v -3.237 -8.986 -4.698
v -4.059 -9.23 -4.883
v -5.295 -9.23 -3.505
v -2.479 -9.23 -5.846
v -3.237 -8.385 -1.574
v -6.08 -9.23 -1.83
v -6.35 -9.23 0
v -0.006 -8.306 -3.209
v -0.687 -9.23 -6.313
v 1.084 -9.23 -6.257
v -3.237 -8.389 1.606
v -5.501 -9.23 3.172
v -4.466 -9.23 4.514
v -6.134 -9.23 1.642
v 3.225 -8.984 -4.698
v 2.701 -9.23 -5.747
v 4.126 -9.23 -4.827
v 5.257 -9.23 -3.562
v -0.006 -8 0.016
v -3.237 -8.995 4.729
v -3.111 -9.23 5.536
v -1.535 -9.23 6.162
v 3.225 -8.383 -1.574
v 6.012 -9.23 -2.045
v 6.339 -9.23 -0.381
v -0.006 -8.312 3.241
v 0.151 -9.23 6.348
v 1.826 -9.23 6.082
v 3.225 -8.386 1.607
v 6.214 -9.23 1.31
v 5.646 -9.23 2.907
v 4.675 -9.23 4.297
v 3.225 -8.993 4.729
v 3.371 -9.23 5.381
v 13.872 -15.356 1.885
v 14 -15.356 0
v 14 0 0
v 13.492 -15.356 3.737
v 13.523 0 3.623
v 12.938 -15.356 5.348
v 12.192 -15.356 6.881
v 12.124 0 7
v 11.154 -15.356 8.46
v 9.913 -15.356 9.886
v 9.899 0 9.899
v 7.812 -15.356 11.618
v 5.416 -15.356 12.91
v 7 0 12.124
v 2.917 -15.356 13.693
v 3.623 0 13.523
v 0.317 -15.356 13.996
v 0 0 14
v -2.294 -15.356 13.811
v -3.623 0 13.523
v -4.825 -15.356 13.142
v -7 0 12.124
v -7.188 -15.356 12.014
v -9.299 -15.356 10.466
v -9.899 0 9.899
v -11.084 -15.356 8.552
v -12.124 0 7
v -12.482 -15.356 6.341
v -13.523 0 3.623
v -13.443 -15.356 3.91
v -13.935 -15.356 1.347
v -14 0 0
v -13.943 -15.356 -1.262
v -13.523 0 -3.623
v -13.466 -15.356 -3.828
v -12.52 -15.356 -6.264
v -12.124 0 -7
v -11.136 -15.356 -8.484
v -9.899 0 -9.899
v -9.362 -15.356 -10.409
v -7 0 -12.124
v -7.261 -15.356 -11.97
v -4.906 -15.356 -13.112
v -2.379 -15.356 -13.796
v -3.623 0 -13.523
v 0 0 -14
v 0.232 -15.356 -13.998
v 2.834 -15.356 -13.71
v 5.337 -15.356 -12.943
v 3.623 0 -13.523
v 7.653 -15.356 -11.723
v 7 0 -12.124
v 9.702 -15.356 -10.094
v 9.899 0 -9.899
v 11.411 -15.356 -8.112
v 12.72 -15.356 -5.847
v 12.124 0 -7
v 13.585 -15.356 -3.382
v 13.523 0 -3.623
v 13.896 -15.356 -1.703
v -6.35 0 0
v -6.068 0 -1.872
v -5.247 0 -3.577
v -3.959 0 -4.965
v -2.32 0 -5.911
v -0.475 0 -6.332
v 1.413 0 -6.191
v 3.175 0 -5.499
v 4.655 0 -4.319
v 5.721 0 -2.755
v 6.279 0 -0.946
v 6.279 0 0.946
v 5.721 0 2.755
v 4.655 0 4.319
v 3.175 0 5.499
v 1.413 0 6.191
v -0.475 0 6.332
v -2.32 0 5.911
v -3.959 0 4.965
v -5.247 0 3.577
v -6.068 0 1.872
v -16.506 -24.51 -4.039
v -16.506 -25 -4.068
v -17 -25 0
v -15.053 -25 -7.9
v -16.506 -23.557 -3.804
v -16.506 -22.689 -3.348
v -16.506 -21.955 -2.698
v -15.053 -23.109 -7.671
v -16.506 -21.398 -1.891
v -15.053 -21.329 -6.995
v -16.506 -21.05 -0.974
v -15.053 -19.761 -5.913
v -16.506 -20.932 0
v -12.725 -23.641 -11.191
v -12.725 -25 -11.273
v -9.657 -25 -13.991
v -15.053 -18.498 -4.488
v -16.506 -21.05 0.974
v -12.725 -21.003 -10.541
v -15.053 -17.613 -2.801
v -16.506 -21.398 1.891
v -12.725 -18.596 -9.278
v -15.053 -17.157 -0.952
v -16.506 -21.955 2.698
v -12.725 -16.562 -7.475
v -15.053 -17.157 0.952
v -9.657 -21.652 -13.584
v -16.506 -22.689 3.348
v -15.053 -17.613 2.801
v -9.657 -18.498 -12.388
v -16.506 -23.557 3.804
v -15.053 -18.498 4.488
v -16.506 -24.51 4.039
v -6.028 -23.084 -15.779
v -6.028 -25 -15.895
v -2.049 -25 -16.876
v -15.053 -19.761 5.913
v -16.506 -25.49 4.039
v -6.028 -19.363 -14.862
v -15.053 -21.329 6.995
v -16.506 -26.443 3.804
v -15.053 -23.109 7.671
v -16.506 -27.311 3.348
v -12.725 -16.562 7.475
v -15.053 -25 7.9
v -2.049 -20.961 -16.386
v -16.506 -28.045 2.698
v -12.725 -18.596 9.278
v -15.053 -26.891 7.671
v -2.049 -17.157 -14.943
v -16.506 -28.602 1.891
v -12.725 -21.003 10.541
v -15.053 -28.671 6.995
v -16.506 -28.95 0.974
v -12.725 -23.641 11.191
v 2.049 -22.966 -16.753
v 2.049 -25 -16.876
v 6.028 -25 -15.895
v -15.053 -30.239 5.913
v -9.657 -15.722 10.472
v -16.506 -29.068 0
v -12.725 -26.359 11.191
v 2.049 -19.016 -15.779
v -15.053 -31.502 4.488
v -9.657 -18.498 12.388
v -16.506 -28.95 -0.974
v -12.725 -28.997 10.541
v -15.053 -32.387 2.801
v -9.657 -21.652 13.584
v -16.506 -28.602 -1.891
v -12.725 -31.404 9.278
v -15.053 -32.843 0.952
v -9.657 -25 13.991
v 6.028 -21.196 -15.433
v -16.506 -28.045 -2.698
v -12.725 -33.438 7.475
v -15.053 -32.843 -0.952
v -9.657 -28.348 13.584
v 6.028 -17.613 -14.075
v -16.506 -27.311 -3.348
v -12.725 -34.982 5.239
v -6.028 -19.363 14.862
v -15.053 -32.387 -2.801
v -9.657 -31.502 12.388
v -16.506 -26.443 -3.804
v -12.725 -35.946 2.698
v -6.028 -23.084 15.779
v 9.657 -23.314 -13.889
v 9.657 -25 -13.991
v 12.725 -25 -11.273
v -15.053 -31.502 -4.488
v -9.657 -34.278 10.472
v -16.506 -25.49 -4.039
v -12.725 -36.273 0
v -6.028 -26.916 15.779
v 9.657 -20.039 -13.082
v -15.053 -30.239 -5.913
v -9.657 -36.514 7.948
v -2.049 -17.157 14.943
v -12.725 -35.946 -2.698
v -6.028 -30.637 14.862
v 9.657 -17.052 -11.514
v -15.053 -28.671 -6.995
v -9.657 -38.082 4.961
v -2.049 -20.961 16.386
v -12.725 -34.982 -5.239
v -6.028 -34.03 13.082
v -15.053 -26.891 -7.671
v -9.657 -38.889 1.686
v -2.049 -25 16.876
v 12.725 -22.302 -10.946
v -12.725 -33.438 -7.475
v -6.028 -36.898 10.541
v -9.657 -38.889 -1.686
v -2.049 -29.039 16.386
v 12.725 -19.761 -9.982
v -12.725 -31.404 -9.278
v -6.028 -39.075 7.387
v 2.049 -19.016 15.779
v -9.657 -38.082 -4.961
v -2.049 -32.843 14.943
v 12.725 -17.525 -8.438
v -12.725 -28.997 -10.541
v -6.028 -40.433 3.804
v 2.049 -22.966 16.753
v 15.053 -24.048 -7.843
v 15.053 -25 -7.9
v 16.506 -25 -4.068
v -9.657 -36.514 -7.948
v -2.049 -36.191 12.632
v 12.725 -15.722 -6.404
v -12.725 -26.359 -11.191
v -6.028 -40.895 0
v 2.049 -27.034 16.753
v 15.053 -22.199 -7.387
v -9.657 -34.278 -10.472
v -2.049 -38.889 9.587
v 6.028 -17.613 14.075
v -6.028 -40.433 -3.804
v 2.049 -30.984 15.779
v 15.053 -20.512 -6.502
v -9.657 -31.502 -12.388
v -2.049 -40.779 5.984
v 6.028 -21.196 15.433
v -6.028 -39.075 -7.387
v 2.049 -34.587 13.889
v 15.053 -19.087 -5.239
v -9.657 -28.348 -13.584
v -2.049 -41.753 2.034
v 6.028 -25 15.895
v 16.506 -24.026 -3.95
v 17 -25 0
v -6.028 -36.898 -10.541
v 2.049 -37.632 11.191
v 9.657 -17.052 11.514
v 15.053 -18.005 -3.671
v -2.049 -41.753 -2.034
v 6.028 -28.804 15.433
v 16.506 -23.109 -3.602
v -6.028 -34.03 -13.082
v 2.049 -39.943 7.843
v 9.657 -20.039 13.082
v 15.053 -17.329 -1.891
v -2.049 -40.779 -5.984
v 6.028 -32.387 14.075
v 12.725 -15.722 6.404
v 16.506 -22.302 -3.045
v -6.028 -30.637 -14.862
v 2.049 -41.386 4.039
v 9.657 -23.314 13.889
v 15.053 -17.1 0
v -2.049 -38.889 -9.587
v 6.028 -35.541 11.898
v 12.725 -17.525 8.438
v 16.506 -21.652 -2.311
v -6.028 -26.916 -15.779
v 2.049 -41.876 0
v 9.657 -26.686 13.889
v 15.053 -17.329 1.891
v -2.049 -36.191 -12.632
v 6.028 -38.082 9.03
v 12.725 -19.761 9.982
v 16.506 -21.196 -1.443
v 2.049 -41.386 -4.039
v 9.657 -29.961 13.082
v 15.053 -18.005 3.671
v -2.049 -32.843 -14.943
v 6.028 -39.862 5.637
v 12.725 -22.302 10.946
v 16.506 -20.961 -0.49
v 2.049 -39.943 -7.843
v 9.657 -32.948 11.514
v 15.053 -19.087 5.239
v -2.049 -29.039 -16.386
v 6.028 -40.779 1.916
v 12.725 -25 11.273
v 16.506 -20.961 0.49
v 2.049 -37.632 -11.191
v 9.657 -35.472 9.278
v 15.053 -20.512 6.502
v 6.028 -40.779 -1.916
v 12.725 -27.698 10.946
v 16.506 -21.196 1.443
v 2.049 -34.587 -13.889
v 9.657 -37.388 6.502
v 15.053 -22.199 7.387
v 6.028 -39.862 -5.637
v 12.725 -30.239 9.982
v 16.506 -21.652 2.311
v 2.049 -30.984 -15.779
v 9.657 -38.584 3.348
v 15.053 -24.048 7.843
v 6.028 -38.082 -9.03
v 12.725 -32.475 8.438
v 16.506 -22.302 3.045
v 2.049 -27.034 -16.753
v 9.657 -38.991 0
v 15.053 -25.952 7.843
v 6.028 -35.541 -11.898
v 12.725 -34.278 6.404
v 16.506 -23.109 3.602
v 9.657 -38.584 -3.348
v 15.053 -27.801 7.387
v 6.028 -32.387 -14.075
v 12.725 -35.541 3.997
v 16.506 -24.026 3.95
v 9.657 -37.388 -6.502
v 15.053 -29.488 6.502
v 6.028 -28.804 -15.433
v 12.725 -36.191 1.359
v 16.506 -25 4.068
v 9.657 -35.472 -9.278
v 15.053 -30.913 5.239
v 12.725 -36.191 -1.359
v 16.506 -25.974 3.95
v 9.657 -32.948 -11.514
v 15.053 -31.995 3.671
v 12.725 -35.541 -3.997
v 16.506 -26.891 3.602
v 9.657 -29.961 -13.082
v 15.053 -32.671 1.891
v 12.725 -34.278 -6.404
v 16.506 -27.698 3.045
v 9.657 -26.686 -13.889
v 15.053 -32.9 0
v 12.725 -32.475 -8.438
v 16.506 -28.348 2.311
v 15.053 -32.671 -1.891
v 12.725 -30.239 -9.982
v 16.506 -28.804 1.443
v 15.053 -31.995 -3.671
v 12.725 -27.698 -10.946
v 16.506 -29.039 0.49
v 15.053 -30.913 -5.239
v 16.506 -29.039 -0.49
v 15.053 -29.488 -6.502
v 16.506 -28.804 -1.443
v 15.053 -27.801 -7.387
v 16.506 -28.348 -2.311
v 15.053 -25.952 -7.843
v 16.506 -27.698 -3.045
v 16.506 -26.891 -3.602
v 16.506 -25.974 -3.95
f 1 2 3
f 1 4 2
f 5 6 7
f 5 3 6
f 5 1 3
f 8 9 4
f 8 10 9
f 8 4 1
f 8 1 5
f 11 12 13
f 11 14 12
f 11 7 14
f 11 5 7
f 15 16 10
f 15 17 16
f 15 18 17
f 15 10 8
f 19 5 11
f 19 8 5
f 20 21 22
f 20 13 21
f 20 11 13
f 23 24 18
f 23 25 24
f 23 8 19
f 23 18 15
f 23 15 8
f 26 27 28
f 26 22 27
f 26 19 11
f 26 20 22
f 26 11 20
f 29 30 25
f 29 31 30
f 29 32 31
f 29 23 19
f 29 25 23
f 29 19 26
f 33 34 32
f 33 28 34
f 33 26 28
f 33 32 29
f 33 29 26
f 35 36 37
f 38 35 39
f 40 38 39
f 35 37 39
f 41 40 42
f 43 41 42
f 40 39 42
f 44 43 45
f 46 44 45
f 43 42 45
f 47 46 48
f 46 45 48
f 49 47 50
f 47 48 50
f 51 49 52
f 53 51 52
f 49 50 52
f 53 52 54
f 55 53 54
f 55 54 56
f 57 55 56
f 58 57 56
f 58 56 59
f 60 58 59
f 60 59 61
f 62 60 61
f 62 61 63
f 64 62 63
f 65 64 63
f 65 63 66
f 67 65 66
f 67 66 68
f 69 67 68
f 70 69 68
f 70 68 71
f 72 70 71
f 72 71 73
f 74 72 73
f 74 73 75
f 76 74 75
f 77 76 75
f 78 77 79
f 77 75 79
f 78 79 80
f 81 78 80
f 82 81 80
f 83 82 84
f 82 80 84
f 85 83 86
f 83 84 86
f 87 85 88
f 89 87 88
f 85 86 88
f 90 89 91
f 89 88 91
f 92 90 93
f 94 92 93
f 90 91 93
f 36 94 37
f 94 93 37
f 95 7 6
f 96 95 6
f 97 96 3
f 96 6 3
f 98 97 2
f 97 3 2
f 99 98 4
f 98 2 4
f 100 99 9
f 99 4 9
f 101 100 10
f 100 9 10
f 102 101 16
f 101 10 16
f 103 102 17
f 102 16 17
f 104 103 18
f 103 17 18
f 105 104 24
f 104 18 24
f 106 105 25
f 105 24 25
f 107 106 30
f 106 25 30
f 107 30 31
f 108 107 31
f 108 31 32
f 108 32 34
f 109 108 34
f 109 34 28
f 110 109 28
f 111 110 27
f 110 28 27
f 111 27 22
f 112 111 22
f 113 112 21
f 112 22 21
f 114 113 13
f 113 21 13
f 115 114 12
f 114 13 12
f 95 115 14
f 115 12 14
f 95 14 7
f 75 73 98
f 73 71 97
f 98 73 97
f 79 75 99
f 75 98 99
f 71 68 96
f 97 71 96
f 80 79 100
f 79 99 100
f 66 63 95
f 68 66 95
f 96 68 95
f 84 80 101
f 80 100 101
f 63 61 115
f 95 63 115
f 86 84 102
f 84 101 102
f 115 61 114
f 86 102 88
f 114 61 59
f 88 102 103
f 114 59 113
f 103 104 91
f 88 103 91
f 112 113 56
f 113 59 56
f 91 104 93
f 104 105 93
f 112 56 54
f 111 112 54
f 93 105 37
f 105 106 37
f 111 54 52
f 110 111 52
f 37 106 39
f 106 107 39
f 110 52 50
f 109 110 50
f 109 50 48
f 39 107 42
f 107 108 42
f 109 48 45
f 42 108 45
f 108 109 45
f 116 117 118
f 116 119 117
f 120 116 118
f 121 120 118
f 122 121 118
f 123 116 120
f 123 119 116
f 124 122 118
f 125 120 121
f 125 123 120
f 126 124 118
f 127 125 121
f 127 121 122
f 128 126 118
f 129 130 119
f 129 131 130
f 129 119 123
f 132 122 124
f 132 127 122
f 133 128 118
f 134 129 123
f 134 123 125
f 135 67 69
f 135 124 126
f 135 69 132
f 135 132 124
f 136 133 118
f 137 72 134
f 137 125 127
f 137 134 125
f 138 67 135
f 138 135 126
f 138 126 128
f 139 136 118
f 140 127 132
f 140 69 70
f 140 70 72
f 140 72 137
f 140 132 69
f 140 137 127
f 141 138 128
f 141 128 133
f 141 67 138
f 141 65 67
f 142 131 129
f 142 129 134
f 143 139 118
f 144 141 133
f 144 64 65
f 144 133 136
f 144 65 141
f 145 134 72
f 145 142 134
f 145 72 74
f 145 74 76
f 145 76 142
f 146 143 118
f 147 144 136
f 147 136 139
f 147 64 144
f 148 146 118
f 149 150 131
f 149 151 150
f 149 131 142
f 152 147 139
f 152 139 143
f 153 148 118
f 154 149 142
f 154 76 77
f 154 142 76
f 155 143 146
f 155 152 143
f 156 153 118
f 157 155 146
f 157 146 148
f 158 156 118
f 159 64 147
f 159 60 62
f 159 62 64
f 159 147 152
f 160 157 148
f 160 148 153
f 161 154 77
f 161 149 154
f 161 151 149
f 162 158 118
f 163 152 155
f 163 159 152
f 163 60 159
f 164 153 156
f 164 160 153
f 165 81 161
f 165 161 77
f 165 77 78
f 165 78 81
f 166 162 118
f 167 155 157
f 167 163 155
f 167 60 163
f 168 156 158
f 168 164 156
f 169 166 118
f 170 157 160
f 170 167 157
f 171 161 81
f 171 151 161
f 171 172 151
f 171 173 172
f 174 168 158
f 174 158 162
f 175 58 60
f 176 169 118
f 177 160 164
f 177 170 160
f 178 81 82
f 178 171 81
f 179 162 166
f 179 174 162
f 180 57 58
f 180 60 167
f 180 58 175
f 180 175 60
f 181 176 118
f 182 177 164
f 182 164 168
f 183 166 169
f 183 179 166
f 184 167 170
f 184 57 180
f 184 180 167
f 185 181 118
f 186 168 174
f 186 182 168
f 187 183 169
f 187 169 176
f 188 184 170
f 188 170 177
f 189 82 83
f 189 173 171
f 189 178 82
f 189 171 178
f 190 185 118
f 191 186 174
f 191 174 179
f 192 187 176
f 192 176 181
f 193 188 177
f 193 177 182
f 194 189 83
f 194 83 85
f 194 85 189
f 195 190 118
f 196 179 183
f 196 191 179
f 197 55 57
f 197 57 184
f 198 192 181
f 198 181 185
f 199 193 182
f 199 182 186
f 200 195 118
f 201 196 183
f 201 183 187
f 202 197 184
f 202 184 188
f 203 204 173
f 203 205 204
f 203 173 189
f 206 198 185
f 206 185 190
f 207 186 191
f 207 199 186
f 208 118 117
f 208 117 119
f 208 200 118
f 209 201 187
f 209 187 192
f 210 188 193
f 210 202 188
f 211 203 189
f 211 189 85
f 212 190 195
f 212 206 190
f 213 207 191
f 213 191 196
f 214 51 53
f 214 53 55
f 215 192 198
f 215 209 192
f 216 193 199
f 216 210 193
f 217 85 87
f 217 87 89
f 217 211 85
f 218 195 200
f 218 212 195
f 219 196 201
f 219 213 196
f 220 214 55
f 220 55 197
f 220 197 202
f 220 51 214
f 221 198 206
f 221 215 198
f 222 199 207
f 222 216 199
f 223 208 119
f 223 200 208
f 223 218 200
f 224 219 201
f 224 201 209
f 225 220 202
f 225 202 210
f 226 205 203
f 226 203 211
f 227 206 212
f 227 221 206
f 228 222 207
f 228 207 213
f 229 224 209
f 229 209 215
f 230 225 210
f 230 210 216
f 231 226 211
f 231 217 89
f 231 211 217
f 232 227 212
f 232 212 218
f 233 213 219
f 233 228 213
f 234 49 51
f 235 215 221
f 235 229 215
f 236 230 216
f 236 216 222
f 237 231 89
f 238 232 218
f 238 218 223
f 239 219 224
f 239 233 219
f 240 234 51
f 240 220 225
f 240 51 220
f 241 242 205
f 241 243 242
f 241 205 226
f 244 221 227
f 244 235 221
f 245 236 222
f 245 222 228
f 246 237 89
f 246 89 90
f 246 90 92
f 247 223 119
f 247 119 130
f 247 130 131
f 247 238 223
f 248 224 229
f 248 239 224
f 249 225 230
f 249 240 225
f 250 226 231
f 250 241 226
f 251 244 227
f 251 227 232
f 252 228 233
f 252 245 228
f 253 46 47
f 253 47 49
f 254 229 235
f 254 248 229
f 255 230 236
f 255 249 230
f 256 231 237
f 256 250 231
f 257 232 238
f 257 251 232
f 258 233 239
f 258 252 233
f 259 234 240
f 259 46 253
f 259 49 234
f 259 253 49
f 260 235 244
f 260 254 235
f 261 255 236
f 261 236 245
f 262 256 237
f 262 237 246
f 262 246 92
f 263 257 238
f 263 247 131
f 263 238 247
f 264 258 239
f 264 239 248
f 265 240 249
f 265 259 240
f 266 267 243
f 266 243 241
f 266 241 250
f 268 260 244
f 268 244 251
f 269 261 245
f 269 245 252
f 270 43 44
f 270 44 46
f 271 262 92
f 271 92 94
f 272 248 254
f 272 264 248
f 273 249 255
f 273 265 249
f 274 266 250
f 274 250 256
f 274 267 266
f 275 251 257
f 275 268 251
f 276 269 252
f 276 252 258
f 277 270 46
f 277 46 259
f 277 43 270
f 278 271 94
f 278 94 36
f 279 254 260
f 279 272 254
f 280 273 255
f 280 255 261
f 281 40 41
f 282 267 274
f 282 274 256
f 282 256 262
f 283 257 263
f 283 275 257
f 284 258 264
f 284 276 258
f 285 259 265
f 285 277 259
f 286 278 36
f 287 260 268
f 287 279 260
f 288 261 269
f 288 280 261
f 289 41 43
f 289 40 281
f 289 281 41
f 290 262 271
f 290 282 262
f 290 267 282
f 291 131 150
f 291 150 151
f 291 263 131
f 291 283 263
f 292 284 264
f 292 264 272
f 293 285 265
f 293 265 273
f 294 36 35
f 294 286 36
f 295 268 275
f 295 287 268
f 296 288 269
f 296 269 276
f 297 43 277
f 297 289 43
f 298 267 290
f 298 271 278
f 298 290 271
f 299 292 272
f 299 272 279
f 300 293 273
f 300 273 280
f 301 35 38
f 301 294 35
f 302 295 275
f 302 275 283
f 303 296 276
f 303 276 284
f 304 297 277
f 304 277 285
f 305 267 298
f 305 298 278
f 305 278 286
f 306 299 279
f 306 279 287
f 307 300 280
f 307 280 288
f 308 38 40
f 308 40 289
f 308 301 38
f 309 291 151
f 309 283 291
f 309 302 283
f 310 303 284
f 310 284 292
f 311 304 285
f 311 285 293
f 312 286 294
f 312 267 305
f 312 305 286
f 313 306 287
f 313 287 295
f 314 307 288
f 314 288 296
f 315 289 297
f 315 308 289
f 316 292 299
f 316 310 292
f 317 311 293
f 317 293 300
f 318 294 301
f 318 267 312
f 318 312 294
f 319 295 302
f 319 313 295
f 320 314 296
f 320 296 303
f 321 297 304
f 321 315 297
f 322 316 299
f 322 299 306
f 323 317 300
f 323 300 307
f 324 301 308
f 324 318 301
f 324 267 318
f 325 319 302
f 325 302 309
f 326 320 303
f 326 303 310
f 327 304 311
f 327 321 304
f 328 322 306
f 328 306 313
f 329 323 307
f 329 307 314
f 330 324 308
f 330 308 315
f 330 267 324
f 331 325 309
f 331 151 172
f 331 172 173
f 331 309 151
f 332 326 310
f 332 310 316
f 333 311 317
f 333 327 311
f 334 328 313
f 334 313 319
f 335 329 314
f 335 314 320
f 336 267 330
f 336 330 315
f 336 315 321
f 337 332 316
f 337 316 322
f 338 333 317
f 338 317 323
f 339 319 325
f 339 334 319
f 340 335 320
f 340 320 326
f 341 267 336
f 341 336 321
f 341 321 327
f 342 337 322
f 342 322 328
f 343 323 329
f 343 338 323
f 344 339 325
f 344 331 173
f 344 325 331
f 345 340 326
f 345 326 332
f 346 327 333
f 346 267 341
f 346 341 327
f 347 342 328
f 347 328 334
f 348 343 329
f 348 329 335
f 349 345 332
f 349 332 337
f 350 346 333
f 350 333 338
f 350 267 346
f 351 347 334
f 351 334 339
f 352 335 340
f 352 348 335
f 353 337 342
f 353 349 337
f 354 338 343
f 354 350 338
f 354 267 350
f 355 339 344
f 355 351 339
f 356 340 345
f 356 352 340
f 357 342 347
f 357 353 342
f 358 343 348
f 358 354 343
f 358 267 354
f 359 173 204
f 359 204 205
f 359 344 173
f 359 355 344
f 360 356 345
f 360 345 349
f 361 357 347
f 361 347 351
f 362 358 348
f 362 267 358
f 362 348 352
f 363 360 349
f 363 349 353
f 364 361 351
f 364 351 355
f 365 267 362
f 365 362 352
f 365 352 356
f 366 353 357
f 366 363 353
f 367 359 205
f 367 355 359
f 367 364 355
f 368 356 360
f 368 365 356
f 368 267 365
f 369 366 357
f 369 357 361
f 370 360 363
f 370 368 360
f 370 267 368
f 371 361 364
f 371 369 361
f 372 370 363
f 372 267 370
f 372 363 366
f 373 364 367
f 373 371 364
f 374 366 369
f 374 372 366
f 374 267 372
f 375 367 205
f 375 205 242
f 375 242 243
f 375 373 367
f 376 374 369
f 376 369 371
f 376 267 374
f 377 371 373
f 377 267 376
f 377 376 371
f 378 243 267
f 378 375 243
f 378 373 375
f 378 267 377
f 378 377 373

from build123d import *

# Parameters (mm, degrees)
F0_R     = 14
F0_R_2   = 11.6
F1_DEPTH = 25
F2_D     = 12.7
F2_DEPTH = 14
F2_TIP   = 3.8154649308


# Not quite as in the source:
# - a length typed as a fraction of an inch, garbled in the dataset ("3 / 203.2 mm" for 3/8 in), is restored


with BuildPart() as f1:
    # F0 (on Front) → F1 (new body)
    with BuildSketch(Plane.XZ):
        Circle(F0_R)
        Circle(F0_R_2, mode=Mode.SUBTRACT)
        Circle(F0_R_2)
    extrude(amount=F1_DEPTH)

    # F2
    with Locations(Plane(origin=(0, 0, 0), x_dir=(1, 0, 0), z_dir=(0, 1, 0))):
        with Locations((0, 0)):
            Hole(F2_D / 2, depth=F2_DEPTH)
            with Locations((0, 0, -(F2_DEPTH + F2_TIP / 2))):  # 118° drill point
                Cone(0, F2_D / 2, F2_TIP, mode=Mode.SUBTRACT)

    # F3 (on face) → F4 (revolve)
    with BuildSketch(Plane.XZ.offset(25)):
        with BuildLine():
            Line((17, 0), (14, 0))
            ThreePointArc((14, 0), (0, -14), (-14, 0))
            Line((-14, 0), (-17, 0))
            ThreePointArc((-17, 0), (0, -17), (17, 0))
        make_face()
        with BuildLine():
            ThreePointArc((-14, 0), (0, -14), (14, 0))
            Line((14, 0), (-14, 0))
        make_face()
    revolve(axis=Axis((0, -25, 0), (1, 0, 0)))


solid = f1.part
